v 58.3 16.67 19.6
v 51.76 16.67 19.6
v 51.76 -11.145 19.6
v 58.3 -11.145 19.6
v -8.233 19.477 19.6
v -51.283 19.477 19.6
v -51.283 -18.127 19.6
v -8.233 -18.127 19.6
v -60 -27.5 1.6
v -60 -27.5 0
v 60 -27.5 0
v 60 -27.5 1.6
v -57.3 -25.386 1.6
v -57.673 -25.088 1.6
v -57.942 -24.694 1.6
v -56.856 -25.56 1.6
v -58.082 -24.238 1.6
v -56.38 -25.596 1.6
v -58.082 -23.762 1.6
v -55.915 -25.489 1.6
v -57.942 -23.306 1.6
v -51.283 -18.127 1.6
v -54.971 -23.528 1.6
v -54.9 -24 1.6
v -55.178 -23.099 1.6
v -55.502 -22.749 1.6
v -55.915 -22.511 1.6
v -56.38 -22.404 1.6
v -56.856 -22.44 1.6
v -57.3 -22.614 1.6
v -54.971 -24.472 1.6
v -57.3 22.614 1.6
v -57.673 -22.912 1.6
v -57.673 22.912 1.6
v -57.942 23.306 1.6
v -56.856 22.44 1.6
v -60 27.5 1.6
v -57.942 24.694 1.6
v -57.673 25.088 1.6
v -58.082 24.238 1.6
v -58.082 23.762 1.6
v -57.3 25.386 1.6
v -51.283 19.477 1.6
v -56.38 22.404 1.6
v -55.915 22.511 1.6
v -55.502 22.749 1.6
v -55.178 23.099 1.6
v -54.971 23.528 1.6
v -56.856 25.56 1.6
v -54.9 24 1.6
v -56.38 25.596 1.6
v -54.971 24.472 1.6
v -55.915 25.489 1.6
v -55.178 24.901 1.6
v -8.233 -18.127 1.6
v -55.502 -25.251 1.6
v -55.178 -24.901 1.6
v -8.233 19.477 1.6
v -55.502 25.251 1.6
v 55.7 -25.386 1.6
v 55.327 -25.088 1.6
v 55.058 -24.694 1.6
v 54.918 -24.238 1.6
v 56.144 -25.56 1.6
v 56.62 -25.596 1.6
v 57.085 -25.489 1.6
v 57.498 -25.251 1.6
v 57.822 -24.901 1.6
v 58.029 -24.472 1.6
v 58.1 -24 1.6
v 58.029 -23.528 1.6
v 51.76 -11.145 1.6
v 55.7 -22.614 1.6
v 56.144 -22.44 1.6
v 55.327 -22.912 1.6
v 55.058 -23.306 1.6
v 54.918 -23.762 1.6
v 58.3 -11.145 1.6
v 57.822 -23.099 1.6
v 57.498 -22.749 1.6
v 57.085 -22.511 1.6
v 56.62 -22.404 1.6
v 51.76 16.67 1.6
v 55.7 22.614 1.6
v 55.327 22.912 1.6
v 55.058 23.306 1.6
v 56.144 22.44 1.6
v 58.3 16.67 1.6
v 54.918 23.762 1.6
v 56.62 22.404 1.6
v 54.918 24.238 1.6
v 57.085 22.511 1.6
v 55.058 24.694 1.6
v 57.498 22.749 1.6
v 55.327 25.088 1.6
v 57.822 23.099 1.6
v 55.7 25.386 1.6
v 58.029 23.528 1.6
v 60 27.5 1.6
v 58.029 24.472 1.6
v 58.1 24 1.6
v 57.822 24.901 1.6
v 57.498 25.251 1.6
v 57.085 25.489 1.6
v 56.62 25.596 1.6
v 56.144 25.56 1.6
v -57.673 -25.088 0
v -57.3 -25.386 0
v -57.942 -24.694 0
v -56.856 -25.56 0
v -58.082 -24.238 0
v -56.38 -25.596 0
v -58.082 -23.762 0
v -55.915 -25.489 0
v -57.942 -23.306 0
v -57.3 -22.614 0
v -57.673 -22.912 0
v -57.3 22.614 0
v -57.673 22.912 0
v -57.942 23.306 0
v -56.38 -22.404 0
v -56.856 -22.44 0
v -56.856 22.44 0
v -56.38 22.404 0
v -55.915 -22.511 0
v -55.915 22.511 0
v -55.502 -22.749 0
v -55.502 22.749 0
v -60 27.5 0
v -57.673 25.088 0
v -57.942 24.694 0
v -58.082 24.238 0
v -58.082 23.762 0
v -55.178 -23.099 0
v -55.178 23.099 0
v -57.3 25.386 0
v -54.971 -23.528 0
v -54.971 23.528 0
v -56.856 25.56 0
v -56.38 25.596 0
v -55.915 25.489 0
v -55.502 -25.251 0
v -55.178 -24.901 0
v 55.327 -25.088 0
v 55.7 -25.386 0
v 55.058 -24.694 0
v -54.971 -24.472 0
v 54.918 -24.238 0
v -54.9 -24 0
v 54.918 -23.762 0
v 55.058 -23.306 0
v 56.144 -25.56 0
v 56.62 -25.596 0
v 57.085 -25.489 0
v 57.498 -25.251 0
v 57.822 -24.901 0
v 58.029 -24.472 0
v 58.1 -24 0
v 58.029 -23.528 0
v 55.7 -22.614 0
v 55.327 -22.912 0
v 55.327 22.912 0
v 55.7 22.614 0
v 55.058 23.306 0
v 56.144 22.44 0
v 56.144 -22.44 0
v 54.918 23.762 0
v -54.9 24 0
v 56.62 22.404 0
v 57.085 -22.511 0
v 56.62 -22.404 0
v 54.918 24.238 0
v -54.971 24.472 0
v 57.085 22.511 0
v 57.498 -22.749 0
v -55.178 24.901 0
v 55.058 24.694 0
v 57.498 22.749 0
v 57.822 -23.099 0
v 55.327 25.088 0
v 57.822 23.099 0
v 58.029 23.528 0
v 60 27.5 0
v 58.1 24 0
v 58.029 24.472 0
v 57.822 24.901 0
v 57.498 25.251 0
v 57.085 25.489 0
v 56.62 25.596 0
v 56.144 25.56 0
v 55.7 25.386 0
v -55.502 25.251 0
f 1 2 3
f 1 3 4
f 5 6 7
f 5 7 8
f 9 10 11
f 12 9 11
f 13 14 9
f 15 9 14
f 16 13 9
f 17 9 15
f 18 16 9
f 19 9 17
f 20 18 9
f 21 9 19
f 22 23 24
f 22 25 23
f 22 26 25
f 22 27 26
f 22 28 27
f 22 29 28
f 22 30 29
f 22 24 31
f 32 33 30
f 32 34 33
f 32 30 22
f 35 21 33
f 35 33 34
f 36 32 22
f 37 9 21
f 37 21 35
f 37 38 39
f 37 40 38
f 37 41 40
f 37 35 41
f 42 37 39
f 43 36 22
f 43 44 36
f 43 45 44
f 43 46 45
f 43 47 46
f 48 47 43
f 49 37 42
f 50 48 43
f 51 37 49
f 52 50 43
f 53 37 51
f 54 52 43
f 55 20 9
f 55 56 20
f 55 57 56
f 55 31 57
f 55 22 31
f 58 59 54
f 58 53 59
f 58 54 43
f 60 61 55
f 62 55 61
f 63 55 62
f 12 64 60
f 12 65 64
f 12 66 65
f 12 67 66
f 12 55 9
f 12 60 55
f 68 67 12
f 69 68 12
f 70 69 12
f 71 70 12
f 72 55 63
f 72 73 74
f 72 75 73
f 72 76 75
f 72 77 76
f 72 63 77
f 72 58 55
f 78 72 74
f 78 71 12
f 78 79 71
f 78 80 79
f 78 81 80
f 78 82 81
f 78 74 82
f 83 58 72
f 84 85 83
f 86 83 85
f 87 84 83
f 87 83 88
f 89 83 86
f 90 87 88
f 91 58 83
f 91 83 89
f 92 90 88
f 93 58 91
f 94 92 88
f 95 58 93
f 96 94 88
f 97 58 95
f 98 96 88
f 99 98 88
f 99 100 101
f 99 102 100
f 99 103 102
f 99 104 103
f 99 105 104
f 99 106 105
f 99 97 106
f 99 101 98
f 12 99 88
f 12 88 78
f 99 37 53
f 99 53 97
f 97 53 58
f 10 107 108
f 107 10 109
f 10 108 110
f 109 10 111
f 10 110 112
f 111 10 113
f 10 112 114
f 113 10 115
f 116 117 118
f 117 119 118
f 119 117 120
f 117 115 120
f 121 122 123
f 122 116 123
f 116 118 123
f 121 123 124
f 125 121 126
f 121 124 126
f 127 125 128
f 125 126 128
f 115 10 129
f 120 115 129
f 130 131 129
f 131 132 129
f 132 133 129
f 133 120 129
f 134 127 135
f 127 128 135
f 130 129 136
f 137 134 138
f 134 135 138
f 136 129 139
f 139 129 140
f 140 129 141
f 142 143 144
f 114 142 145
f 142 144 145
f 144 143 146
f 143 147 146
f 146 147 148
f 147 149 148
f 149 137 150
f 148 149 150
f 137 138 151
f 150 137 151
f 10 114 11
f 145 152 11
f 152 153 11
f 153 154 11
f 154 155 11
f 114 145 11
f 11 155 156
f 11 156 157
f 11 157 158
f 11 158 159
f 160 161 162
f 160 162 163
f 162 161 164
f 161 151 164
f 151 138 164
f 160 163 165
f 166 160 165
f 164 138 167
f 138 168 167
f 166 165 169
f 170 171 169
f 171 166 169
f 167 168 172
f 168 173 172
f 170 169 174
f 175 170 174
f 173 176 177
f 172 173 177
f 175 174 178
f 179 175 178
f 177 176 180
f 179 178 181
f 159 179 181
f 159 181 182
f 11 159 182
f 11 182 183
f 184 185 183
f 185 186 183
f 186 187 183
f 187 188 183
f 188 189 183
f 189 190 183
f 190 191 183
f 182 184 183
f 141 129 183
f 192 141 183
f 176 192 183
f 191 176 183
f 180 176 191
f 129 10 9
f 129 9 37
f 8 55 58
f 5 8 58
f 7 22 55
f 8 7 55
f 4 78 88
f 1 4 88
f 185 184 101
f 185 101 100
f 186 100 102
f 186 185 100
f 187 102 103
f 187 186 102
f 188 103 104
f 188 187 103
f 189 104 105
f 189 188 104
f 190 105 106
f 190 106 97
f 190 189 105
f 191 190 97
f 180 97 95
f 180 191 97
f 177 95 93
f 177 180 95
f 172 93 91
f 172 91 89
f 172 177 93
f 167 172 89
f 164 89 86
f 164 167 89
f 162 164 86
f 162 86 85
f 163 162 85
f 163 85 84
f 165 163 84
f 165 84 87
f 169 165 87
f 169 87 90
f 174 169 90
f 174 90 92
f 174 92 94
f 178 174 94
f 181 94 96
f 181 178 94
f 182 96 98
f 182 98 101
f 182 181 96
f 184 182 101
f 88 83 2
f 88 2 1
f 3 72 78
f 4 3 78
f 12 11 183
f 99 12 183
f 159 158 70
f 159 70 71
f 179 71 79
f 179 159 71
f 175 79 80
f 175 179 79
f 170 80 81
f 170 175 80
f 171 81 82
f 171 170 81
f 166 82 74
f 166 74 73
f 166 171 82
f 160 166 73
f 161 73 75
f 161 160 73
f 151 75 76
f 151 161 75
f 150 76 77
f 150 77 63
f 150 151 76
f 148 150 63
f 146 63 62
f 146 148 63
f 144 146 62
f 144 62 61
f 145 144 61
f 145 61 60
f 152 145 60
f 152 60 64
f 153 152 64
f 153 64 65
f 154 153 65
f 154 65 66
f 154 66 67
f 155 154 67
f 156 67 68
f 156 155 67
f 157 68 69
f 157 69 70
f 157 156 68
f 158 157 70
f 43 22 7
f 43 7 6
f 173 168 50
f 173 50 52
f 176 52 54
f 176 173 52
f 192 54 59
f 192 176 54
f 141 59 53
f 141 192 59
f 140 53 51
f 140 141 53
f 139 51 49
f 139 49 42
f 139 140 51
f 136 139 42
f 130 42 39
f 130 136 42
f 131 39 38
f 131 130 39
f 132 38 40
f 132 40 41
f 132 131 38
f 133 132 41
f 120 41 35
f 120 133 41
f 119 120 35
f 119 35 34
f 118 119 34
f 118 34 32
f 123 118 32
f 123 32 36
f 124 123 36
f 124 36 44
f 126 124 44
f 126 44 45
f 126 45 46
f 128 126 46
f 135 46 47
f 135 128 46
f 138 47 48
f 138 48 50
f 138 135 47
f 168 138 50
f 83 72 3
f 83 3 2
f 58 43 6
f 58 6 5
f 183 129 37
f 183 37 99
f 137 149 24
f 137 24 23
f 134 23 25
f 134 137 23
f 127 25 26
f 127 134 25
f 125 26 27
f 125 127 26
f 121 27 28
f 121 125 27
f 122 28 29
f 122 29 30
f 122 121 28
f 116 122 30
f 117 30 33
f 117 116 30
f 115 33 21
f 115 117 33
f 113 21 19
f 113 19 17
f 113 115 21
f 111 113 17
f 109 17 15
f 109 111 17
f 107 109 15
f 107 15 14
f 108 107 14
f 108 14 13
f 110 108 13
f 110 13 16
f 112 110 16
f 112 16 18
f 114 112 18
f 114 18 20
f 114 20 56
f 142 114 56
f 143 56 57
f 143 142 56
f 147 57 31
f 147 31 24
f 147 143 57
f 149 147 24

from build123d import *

# Parameters (mm, degrees)
ESQUISSE1_W        = 120
ESQUISSE1_H        = 55
ESQUISSE1_R        = 1.6
BOSS_EXTRU_1_DEPTH = 1.6
ESQUISSE2_W        = 43.050312428
ESQUISSE2_H        = 37.603564561
ESQUISSE2_W_2      = 6.539195339
ESQUISSE2_H_2      = 27.81484763
BOSS_EXTRU_2_DEPTH = 18


with BuildPart() as part:
    # Esquisse1 → Boss.-Extru.1 (new body)
    with BuildSketch(Plane.XY):
        Rectangle(ESQUISSE1_W, ESQUISSE1_H)
        with Locations((-56.5, 24)):
            Circle(ESQUISSE1_R, mode=Mode.SUBTRACT)
        with Locations((56.5, 24)):
            Circle(ESQUISSE1_R, mode=Mode.SUBTRACT)
        with Locations((56.5, -24)):
            Circle(ESQUISSE1_R, mode=Mode.SUBTRACT)
        with Locations((-56.5, -24)):
            Circle(ESQUISSE1_R, mode=Mode.SUBTRACT)
    extrude(amount=BOSS_EXTRU_1_DEPTH)

    # Esquisse2 → Boss.-Extru.2 (add)
    with BuildSketch(Plane.XY.offset(1.6)):
        with Locations((-29.757687253, 0.675058423)):
            Rectangle(ESQUISSE2_W, ESQUISSE2_H)
        with Locations((55.030096994, 2.76225902)):
            Rectangle(ESQUISSE2_W_2, ESQUISSE2_H_2)
    extrude(amount=BOSS_EXTRU_2_DEPTH)


solid = part.part
